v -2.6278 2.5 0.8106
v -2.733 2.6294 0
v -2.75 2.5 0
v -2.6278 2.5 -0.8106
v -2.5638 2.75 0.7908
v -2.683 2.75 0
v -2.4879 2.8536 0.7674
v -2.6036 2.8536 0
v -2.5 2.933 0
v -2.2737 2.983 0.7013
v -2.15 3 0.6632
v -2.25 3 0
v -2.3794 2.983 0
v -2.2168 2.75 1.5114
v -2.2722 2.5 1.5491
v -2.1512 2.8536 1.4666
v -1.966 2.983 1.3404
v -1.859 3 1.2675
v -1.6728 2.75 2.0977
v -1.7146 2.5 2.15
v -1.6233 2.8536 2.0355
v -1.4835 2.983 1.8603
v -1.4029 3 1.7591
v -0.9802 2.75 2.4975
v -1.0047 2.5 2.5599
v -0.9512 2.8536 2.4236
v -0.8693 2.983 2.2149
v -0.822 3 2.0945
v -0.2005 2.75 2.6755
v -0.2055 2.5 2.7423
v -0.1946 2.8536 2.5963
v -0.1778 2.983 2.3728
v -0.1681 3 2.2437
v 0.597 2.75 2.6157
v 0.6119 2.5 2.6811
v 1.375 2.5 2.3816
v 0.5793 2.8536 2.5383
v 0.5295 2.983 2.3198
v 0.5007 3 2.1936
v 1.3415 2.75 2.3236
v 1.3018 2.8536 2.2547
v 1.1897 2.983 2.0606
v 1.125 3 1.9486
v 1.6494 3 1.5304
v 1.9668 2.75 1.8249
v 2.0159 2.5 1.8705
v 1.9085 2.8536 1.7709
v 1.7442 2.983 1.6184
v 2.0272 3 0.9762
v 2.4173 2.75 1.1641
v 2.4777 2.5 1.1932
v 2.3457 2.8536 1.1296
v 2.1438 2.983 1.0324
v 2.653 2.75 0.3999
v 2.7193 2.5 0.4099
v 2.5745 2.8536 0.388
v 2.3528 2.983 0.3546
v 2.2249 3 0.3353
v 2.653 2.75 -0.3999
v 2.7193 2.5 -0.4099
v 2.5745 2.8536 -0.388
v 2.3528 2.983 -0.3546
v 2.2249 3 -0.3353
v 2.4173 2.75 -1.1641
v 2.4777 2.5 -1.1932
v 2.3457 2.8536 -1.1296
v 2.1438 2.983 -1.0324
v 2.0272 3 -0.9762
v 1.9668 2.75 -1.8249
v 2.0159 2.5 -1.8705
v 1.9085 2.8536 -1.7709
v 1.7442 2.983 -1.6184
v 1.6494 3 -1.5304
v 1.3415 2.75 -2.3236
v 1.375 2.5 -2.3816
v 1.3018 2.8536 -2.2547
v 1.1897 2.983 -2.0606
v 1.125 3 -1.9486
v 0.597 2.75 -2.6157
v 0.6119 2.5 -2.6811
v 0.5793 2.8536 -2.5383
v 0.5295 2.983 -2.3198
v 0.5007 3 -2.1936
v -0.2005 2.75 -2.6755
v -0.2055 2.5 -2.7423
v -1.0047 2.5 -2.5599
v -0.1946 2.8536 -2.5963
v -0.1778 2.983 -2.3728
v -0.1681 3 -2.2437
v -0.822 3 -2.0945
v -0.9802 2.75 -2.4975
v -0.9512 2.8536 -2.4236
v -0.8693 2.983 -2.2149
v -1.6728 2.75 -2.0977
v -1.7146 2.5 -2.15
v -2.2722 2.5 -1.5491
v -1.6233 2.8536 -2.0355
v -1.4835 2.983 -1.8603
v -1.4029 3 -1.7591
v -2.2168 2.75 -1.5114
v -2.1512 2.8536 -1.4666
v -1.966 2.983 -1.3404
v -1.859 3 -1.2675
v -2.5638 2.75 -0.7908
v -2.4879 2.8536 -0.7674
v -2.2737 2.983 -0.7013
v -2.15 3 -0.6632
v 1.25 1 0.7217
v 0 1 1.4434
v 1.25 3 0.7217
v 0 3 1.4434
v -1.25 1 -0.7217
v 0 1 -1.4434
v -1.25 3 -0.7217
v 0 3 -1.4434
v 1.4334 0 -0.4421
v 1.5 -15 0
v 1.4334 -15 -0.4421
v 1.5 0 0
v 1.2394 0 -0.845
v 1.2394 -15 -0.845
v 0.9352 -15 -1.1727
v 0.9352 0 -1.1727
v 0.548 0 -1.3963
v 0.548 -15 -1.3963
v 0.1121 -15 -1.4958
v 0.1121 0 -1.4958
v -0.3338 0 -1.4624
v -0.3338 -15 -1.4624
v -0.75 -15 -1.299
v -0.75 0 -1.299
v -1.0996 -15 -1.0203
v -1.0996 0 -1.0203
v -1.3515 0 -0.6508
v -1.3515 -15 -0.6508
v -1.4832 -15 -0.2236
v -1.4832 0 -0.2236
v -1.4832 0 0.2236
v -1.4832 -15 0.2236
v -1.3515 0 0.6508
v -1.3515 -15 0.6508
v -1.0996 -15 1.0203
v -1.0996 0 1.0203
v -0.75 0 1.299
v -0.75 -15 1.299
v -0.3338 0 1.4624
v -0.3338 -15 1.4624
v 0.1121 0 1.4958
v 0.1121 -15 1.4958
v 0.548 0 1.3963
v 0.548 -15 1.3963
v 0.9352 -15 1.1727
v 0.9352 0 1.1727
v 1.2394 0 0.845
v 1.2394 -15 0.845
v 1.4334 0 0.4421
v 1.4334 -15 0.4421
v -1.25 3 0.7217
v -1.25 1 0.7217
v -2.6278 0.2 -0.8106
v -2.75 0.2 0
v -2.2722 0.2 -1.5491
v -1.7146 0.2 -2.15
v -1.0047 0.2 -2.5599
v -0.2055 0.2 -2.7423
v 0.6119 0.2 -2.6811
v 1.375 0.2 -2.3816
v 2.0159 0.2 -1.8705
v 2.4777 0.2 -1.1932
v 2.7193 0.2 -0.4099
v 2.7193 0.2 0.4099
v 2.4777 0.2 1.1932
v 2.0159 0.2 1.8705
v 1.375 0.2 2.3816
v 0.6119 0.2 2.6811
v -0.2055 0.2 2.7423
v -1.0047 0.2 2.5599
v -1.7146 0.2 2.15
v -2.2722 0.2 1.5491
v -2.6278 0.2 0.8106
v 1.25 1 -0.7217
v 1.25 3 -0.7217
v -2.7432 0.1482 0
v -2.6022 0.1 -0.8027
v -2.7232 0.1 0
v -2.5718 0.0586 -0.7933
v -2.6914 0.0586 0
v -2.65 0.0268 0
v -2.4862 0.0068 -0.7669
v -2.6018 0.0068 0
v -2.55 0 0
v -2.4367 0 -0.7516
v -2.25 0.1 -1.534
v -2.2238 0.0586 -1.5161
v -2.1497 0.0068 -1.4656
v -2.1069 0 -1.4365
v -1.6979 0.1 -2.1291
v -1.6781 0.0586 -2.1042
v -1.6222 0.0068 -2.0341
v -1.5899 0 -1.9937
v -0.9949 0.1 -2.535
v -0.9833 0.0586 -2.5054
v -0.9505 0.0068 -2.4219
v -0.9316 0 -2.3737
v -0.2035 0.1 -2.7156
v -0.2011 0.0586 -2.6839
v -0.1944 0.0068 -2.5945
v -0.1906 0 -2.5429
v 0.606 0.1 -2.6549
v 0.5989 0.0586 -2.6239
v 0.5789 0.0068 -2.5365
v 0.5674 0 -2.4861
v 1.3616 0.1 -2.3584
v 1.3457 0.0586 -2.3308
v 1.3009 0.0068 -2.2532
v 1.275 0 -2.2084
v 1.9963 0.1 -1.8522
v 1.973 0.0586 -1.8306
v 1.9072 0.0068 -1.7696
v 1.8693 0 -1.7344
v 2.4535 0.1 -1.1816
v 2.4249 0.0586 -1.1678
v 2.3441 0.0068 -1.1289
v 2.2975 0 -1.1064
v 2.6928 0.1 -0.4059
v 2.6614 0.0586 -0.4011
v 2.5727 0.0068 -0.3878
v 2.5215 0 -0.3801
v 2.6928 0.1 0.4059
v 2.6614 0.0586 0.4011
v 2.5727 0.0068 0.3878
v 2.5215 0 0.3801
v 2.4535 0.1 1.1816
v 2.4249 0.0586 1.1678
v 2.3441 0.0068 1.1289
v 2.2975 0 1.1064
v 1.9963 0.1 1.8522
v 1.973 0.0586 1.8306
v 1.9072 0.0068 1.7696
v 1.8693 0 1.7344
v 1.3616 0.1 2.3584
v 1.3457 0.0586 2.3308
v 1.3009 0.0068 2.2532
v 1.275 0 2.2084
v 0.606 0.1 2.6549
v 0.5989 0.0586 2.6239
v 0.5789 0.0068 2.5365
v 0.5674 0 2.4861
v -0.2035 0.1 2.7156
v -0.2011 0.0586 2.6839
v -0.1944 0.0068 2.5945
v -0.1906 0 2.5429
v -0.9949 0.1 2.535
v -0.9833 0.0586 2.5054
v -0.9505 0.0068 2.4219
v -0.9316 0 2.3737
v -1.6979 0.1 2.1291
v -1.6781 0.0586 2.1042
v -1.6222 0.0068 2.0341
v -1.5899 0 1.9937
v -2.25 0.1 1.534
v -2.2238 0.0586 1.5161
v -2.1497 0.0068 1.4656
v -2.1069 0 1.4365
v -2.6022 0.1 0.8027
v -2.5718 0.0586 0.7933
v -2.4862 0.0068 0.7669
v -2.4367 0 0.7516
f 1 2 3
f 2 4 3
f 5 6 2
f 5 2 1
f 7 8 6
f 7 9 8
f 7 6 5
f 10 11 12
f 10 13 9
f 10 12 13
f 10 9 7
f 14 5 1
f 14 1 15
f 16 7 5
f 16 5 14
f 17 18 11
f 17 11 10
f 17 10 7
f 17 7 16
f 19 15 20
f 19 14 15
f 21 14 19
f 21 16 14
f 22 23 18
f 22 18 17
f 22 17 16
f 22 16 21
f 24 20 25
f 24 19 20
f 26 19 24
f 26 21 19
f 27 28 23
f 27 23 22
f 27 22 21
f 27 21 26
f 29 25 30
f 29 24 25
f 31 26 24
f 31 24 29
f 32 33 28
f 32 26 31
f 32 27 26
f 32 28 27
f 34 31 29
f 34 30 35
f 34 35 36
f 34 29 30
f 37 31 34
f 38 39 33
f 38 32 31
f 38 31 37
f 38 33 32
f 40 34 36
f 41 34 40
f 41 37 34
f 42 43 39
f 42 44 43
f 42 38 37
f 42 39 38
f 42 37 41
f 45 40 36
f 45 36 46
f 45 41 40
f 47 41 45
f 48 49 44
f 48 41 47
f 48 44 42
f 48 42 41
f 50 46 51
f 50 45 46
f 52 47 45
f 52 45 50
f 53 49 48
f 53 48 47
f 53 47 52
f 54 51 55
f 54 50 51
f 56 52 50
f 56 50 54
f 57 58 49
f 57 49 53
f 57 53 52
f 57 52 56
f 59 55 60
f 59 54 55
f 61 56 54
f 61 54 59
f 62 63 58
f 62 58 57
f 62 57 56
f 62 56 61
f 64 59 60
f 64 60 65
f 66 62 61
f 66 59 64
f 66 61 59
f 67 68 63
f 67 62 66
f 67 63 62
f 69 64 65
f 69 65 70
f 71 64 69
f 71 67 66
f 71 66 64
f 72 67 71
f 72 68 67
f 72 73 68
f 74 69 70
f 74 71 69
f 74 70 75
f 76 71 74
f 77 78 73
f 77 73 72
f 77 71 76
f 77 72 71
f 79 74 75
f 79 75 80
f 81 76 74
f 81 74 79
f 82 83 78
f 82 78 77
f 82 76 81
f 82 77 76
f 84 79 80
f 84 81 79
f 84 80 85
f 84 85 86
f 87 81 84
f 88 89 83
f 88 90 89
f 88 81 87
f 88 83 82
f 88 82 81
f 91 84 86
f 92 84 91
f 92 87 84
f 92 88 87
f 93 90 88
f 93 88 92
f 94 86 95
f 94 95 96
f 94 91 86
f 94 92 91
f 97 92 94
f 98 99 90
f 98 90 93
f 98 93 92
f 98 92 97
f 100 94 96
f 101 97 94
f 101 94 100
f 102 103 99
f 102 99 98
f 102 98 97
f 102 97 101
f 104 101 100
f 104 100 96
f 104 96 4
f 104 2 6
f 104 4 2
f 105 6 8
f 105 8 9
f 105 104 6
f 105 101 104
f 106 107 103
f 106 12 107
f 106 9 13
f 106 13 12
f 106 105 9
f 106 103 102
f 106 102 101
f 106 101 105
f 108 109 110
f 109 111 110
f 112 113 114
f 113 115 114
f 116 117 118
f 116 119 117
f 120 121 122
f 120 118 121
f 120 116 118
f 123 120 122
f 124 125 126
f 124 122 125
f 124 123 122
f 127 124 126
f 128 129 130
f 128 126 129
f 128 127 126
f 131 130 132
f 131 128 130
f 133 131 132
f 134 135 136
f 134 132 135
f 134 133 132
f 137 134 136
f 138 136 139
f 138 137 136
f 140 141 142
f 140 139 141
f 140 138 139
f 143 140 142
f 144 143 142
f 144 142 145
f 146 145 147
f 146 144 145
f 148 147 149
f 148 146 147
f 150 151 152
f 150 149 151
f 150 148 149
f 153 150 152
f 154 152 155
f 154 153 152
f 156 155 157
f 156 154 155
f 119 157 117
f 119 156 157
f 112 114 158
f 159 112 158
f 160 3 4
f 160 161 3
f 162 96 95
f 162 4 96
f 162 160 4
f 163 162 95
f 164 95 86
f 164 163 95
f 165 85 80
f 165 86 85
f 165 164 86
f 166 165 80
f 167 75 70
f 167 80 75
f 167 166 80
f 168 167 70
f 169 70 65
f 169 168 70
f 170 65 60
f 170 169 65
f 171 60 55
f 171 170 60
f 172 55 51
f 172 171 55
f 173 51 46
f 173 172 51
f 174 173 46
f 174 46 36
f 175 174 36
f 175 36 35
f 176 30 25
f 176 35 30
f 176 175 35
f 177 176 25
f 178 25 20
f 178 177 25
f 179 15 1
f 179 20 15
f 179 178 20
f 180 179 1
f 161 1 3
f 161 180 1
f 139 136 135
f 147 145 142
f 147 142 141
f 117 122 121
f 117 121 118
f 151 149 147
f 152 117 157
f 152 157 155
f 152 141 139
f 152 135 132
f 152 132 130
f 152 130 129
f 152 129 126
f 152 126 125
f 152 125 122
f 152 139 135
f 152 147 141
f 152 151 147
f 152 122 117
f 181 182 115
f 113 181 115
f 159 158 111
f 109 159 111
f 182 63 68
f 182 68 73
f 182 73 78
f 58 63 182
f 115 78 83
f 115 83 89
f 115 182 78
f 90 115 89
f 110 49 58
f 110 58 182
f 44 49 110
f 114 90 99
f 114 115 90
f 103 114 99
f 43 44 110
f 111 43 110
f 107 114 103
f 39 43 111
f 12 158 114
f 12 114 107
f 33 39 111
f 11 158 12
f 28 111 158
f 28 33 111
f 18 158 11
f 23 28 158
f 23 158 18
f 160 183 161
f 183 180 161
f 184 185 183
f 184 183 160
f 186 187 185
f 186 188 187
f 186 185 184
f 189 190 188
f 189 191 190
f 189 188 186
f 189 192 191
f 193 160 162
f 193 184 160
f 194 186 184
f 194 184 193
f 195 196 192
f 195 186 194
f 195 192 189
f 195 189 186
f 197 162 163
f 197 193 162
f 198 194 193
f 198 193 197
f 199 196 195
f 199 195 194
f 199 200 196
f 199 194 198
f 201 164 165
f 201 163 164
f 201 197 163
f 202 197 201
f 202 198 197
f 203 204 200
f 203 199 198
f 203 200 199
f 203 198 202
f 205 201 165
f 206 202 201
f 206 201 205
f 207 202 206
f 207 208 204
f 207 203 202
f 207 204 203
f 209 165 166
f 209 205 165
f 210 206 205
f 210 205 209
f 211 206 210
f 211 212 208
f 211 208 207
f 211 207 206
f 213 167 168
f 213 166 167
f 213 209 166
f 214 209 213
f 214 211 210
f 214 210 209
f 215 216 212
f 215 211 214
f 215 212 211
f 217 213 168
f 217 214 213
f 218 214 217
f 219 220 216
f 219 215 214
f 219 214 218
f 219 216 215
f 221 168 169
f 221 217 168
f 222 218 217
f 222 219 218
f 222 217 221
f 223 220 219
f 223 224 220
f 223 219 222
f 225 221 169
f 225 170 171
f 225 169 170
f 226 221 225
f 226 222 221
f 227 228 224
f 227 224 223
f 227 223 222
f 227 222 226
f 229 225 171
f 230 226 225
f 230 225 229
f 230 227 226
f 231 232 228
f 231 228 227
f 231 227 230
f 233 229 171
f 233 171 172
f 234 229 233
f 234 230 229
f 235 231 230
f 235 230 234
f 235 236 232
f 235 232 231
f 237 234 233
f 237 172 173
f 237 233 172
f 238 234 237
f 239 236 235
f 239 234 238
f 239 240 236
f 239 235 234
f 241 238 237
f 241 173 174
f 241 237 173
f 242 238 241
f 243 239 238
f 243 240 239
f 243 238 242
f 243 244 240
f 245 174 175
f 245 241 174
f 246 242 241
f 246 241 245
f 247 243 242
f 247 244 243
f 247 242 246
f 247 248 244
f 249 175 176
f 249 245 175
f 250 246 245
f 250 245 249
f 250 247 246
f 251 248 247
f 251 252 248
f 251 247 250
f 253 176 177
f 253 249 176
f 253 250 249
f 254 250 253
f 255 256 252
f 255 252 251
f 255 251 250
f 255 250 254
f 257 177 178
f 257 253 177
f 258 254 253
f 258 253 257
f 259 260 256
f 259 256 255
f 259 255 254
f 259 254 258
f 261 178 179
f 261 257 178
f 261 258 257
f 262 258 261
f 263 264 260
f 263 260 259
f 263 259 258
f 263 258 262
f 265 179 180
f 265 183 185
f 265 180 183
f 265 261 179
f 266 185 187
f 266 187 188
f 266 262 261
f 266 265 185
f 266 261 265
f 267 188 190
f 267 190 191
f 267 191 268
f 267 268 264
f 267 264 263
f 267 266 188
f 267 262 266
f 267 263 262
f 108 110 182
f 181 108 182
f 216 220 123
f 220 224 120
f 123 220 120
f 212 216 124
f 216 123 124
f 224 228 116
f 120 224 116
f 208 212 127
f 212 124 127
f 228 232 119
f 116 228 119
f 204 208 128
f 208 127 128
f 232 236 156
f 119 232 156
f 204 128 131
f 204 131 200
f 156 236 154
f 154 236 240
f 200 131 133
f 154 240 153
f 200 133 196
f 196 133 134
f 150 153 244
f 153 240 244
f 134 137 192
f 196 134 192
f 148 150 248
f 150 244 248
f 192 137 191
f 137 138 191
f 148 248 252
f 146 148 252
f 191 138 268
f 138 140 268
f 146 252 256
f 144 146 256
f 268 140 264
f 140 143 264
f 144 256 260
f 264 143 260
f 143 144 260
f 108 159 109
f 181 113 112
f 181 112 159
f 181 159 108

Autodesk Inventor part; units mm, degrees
ref_plane "YZ Plane" through (0, 0, 0) normal (1, 0, 0) x (0, 1, 0)
ref_plane "XZ Plane" through (0, 0, 0) normal (0, 1, 0) x (-1, 0, 0)
ref_plane "XY Plane" through (0, 0, 0) normal (0, 0, 1) x (1, 0, 0)
sketch "スケッチ1" plane through (0, 0, 0) normal (0, 1, 0) x (-1, 0, 0)
  circle A0 centre (0, 0) radius 2.75
  dimension "d0" = 5.5
extrude "押し出し1" add sketch "スケッチ1" along normal blind 3
sketch "スケッチ2" plane through (0, 0, 0) normal (0, -1, 0) x (1, 0, 0)
  circle A0 centre (0, 0) radius 1.5
  dimension "d3" = 3
extrude "押し出し2" add sketch "スケッチ2" along normal blind 15
fillet "フィレット1" radius 0.5 1 edges at (2.75, 3, 0)
fillet "フィレット1" radius 0.2 1 edges at (2.75, 0, 0)
sketch "スケッチ3" plane through (0, 3, 0) normal (0, 1, 0) x (1, 0, 0)
  line L0 (0, 1.4434) -> (-1.25, 0.7217)
  line L1 (-1.25, 0.7217) -> (-1.25, -0.7217)
  line L2 (-1.25, -0.7217) -> (0, -1.4434)
  line L3 (0, -1.4434) -> (1.25, -0.7217)
  line L4 (1.25, -0.7217) -> (1.25, 0.7217)
  line L5 (1.25, 0.7217) -> (0, 1.4434)
  line L6 (0, 1.4434) -> (0, -1.4434) construction
  circle A0 centre (0, 0) radius 1.4434 construction
  dimension "d12" = 2.5
extrude "押し出し3" cut sketch "スケッチ3" against normal blind 2
thread "ねじ1" size "M3x0.5" class "6g" standard "ANSI Metric M Profile" full length
properties part number "M3-CapScrew"
